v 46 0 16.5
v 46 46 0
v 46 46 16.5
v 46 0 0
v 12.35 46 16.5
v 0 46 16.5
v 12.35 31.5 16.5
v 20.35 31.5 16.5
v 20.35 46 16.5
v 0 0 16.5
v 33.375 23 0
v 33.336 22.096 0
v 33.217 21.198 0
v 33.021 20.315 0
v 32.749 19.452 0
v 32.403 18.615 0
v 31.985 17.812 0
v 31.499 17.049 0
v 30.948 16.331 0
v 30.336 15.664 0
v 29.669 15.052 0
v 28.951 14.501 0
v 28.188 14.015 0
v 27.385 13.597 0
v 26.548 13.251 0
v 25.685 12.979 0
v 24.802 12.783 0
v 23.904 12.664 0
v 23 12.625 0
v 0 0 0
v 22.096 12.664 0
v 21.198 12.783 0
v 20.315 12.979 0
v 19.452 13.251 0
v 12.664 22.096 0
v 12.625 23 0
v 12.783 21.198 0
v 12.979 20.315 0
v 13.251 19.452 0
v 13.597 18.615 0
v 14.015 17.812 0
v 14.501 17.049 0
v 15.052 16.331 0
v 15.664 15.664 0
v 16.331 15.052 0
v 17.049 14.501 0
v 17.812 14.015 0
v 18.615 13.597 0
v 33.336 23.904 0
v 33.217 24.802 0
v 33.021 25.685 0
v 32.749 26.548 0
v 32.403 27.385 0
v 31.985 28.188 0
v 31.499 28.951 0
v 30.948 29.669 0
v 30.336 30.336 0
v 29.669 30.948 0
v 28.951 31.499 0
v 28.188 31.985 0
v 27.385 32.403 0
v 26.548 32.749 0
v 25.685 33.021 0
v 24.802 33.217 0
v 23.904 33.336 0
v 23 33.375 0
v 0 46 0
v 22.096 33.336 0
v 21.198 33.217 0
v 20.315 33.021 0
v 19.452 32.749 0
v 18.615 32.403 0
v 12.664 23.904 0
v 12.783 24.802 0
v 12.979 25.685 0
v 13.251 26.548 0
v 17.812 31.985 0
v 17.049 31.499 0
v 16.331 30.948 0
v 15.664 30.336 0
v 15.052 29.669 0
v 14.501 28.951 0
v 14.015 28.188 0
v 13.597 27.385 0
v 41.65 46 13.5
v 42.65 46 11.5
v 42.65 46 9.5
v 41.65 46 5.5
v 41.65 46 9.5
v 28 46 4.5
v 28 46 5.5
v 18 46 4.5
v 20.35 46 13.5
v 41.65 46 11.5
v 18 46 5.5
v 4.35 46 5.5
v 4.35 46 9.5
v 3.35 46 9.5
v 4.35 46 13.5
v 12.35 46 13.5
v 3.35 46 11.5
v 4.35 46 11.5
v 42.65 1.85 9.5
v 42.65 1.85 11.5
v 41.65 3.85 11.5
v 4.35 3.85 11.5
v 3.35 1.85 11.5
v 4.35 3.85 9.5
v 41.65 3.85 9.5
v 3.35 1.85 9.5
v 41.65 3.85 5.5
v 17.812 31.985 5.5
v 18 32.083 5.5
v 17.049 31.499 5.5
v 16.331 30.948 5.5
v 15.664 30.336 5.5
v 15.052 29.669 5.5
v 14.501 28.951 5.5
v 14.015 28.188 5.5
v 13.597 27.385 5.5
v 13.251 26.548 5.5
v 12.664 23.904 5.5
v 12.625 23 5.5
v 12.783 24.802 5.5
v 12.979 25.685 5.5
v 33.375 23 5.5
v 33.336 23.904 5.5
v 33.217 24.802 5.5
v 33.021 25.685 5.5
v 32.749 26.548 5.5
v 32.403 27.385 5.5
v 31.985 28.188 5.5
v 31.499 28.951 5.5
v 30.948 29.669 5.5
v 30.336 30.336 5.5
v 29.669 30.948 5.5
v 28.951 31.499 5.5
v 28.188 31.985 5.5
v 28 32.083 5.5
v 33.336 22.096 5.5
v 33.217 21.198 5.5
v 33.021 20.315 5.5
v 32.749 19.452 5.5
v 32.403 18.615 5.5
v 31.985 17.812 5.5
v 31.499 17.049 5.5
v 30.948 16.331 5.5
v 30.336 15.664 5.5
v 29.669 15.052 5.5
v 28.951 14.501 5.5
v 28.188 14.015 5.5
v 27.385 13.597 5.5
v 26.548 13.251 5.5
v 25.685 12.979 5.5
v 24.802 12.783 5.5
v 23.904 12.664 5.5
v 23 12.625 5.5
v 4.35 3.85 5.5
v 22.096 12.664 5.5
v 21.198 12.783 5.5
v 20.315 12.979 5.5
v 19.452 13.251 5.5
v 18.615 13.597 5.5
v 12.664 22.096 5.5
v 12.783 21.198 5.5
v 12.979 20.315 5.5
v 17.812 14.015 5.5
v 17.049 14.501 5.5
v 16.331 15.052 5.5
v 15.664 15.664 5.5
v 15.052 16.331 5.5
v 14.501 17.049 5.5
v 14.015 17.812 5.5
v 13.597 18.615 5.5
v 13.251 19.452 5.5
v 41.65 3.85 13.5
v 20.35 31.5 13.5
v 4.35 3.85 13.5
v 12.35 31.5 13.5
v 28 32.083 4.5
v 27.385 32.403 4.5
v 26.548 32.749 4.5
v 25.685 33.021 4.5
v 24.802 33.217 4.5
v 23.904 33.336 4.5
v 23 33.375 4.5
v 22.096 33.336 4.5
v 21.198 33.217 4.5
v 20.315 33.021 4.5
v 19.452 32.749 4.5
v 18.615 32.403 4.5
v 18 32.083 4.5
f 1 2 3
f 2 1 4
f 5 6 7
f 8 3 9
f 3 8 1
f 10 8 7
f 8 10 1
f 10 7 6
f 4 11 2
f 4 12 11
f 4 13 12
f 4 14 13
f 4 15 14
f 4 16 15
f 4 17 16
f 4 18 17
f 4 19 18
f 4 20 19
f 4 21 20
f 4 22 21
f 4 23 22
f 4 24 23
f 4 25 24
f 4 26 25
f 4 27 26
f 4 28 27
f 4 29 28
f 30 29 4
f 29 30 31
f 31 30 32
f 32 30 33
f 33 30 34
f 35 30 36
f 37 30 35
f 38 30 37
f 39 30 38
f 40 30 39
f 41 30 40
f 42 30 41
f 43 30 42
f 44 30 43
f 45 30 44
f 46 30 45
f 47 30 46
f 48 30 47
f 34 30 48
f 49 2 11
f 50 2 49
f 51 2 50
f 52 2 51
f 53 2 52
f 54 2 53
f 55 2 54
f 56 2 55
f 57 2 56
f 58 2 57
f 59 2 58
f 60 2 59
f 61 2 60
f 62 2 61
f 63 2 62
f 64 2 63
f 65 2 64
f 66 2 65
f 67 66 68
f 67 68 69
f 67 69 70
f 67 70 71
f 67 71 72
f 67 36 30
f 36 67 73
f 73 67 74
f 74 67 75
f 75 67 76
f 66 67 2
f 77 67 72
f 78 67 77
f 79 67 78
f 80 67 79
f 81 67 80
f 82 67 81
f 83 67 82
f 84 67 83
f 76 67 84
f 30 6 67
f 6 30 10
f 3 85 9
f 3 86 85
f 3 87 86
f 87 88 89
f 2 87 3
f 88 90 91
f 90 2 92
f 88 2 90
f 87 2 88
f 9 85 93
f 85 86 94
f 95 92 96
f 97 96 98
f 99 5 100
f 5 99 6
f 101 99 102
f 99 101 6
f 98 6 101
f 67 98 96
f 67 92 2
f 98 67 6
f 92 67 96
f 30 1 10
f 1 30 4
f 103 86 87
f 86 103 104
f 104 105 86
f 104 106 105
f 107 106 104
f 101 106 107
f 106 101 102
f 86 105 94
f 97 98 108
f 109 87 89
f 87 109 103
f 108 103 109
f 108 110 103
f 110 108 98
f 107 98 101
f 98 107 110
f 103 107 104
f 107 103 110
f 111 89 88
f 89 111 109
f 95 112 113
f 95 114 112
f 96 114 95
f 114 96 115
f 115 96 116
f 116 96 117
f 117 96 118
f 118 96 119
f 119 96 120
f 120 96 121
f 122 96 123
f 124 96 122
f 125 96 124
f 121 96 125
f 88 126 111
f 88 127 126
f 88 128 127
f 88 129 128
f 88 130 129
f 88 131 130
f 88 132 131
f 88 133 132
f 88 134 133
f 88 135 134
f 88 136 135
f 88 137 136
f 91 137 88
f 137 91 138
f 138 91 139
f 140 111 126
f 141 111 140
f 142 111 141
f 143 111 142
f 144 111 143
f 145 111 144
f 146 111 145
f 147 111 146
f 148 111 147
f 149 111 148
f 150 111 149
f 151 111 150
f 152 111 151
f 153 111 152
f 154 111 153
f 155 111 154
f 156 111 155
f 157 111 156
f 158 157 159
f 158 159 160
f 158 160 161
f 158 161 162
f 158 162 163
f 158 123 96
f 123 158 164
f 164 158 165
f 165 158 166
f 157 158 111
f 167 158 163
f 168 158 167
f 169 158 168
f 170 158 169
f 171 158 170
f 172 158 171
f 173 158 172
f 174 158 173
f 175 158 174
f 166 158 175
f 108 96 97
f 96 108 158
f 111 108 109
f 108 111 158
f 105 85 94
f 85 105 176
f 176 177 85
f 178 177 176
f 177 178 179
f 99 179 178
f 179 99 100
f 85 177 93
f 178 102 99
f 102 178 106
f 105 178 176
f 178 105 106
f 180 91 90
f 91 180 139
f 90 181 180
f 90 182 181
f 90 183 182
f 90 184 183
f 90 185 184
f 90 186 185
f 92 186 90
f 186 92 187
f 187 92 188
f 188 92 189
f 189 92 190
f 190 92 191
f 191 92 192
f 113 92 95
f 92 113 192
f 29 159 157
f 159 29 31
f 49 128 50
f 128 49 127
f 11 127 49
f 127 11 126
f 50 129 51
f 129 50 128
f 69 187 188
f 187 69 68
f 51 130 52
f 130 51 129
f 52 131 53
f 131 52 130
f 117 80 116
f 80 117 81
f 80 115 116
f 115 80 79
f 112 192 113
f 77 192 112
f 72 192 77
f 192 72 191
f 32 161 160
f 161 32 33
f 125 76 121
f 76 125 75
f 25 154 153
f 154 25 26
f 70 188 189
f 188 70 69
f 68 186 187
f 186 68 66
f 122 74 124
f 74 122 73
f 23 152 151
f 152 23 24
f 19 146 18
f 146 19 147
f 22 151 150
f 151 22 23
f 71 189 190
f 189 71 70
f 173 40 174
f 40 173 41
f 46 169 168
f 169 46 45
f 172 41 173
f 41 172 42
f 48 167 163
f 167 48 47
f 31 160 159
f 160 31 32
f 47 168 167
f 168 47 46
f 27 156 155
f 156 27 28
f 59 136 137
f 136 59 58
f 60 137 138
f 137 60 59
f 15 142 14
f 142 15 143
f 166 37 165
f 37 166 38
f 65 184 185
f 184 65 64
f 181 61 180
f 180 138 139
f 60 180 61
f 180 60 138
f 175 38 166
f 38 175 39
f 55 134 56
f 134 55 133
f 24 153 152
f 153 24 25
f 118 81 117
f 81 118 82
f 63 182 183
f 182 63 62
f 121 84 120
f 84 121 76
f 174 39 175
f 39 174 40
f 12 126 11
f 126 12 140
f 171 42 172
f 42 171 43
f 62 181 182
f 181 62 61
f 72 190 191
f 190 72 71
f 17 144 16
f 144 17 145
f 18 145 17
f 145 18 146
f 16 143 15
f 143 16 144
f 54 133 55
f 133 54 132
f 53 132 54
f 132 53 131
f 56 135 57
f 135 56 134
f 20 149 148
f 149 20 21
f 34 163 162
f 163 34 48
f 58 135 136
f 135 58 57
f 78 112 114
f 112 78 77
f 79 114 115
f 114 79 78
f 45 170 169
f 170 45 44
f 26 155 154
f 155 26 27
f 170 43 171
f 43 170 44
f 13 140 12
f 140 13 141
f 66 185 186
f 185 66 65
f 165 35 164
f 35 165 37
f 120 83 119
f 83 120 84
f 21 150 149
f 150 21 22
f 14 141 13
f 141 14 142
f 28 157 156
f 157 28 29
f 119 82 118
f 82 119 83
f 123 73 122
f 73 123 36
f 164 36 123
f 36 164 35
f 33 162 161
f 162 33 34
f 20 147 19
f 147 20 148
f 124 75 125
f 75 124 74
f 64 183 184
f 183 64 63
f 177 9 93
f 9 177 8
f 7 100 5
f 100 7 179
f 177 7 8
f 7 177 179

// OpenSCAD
// Adaptor to hold camera over objective lens
// Camera is the Arducam X002BU078X
// There is an old version and new version.
$fa=5;
$fs=0.1;
width=46;// Old:40/ New: 40
length=46;// 
depth=14.5;//13.5 was the original.14.5 is the default...
cwidth=38.3;//camera board width: Old: 32.2 / New: 38.5
objdia=19.75;//nominal diameter of objective threads (20.25 first; then decrease...)
//for makerbot this is too small
difference(){
    cube([length,width,depth+2]);
    translate([(width-cwidth)/2-0.5,(width-cwidth)/2-2.0,depth-5])cube([cwidth+1,cwidth+1+10,2]);//board slot - new
//    translate([(width-cwidth)/2-0.5,(width-cwidth)/2-0.5,depth-5])cube([cwidth+1,cwidth+1+10,2]);//board slot - old
    translate([(width-cwidth)/2+0.5,(width-cwidth)/2,depth-9])cube([cwidth-1,cwidth+10,4]);//opening below
    translate([(width-cwidth)/2+0.5,(width-cwidth)/2,depth-3])cube([cwidth-1,cwidth+10,2]);//opening for electronics on top of board
    translate([width/2-5,width/2,depth-10])cube([10,width/2,2]);//opening for camera   
    translate([width/2,width/2,0])cylinder(depth-7,d=objdia+1);
    translate([width/2-10.65,30.5+1.0,8])cube([8.0,20,100],center=false);//opening for usb cable connector - new only
    

}
